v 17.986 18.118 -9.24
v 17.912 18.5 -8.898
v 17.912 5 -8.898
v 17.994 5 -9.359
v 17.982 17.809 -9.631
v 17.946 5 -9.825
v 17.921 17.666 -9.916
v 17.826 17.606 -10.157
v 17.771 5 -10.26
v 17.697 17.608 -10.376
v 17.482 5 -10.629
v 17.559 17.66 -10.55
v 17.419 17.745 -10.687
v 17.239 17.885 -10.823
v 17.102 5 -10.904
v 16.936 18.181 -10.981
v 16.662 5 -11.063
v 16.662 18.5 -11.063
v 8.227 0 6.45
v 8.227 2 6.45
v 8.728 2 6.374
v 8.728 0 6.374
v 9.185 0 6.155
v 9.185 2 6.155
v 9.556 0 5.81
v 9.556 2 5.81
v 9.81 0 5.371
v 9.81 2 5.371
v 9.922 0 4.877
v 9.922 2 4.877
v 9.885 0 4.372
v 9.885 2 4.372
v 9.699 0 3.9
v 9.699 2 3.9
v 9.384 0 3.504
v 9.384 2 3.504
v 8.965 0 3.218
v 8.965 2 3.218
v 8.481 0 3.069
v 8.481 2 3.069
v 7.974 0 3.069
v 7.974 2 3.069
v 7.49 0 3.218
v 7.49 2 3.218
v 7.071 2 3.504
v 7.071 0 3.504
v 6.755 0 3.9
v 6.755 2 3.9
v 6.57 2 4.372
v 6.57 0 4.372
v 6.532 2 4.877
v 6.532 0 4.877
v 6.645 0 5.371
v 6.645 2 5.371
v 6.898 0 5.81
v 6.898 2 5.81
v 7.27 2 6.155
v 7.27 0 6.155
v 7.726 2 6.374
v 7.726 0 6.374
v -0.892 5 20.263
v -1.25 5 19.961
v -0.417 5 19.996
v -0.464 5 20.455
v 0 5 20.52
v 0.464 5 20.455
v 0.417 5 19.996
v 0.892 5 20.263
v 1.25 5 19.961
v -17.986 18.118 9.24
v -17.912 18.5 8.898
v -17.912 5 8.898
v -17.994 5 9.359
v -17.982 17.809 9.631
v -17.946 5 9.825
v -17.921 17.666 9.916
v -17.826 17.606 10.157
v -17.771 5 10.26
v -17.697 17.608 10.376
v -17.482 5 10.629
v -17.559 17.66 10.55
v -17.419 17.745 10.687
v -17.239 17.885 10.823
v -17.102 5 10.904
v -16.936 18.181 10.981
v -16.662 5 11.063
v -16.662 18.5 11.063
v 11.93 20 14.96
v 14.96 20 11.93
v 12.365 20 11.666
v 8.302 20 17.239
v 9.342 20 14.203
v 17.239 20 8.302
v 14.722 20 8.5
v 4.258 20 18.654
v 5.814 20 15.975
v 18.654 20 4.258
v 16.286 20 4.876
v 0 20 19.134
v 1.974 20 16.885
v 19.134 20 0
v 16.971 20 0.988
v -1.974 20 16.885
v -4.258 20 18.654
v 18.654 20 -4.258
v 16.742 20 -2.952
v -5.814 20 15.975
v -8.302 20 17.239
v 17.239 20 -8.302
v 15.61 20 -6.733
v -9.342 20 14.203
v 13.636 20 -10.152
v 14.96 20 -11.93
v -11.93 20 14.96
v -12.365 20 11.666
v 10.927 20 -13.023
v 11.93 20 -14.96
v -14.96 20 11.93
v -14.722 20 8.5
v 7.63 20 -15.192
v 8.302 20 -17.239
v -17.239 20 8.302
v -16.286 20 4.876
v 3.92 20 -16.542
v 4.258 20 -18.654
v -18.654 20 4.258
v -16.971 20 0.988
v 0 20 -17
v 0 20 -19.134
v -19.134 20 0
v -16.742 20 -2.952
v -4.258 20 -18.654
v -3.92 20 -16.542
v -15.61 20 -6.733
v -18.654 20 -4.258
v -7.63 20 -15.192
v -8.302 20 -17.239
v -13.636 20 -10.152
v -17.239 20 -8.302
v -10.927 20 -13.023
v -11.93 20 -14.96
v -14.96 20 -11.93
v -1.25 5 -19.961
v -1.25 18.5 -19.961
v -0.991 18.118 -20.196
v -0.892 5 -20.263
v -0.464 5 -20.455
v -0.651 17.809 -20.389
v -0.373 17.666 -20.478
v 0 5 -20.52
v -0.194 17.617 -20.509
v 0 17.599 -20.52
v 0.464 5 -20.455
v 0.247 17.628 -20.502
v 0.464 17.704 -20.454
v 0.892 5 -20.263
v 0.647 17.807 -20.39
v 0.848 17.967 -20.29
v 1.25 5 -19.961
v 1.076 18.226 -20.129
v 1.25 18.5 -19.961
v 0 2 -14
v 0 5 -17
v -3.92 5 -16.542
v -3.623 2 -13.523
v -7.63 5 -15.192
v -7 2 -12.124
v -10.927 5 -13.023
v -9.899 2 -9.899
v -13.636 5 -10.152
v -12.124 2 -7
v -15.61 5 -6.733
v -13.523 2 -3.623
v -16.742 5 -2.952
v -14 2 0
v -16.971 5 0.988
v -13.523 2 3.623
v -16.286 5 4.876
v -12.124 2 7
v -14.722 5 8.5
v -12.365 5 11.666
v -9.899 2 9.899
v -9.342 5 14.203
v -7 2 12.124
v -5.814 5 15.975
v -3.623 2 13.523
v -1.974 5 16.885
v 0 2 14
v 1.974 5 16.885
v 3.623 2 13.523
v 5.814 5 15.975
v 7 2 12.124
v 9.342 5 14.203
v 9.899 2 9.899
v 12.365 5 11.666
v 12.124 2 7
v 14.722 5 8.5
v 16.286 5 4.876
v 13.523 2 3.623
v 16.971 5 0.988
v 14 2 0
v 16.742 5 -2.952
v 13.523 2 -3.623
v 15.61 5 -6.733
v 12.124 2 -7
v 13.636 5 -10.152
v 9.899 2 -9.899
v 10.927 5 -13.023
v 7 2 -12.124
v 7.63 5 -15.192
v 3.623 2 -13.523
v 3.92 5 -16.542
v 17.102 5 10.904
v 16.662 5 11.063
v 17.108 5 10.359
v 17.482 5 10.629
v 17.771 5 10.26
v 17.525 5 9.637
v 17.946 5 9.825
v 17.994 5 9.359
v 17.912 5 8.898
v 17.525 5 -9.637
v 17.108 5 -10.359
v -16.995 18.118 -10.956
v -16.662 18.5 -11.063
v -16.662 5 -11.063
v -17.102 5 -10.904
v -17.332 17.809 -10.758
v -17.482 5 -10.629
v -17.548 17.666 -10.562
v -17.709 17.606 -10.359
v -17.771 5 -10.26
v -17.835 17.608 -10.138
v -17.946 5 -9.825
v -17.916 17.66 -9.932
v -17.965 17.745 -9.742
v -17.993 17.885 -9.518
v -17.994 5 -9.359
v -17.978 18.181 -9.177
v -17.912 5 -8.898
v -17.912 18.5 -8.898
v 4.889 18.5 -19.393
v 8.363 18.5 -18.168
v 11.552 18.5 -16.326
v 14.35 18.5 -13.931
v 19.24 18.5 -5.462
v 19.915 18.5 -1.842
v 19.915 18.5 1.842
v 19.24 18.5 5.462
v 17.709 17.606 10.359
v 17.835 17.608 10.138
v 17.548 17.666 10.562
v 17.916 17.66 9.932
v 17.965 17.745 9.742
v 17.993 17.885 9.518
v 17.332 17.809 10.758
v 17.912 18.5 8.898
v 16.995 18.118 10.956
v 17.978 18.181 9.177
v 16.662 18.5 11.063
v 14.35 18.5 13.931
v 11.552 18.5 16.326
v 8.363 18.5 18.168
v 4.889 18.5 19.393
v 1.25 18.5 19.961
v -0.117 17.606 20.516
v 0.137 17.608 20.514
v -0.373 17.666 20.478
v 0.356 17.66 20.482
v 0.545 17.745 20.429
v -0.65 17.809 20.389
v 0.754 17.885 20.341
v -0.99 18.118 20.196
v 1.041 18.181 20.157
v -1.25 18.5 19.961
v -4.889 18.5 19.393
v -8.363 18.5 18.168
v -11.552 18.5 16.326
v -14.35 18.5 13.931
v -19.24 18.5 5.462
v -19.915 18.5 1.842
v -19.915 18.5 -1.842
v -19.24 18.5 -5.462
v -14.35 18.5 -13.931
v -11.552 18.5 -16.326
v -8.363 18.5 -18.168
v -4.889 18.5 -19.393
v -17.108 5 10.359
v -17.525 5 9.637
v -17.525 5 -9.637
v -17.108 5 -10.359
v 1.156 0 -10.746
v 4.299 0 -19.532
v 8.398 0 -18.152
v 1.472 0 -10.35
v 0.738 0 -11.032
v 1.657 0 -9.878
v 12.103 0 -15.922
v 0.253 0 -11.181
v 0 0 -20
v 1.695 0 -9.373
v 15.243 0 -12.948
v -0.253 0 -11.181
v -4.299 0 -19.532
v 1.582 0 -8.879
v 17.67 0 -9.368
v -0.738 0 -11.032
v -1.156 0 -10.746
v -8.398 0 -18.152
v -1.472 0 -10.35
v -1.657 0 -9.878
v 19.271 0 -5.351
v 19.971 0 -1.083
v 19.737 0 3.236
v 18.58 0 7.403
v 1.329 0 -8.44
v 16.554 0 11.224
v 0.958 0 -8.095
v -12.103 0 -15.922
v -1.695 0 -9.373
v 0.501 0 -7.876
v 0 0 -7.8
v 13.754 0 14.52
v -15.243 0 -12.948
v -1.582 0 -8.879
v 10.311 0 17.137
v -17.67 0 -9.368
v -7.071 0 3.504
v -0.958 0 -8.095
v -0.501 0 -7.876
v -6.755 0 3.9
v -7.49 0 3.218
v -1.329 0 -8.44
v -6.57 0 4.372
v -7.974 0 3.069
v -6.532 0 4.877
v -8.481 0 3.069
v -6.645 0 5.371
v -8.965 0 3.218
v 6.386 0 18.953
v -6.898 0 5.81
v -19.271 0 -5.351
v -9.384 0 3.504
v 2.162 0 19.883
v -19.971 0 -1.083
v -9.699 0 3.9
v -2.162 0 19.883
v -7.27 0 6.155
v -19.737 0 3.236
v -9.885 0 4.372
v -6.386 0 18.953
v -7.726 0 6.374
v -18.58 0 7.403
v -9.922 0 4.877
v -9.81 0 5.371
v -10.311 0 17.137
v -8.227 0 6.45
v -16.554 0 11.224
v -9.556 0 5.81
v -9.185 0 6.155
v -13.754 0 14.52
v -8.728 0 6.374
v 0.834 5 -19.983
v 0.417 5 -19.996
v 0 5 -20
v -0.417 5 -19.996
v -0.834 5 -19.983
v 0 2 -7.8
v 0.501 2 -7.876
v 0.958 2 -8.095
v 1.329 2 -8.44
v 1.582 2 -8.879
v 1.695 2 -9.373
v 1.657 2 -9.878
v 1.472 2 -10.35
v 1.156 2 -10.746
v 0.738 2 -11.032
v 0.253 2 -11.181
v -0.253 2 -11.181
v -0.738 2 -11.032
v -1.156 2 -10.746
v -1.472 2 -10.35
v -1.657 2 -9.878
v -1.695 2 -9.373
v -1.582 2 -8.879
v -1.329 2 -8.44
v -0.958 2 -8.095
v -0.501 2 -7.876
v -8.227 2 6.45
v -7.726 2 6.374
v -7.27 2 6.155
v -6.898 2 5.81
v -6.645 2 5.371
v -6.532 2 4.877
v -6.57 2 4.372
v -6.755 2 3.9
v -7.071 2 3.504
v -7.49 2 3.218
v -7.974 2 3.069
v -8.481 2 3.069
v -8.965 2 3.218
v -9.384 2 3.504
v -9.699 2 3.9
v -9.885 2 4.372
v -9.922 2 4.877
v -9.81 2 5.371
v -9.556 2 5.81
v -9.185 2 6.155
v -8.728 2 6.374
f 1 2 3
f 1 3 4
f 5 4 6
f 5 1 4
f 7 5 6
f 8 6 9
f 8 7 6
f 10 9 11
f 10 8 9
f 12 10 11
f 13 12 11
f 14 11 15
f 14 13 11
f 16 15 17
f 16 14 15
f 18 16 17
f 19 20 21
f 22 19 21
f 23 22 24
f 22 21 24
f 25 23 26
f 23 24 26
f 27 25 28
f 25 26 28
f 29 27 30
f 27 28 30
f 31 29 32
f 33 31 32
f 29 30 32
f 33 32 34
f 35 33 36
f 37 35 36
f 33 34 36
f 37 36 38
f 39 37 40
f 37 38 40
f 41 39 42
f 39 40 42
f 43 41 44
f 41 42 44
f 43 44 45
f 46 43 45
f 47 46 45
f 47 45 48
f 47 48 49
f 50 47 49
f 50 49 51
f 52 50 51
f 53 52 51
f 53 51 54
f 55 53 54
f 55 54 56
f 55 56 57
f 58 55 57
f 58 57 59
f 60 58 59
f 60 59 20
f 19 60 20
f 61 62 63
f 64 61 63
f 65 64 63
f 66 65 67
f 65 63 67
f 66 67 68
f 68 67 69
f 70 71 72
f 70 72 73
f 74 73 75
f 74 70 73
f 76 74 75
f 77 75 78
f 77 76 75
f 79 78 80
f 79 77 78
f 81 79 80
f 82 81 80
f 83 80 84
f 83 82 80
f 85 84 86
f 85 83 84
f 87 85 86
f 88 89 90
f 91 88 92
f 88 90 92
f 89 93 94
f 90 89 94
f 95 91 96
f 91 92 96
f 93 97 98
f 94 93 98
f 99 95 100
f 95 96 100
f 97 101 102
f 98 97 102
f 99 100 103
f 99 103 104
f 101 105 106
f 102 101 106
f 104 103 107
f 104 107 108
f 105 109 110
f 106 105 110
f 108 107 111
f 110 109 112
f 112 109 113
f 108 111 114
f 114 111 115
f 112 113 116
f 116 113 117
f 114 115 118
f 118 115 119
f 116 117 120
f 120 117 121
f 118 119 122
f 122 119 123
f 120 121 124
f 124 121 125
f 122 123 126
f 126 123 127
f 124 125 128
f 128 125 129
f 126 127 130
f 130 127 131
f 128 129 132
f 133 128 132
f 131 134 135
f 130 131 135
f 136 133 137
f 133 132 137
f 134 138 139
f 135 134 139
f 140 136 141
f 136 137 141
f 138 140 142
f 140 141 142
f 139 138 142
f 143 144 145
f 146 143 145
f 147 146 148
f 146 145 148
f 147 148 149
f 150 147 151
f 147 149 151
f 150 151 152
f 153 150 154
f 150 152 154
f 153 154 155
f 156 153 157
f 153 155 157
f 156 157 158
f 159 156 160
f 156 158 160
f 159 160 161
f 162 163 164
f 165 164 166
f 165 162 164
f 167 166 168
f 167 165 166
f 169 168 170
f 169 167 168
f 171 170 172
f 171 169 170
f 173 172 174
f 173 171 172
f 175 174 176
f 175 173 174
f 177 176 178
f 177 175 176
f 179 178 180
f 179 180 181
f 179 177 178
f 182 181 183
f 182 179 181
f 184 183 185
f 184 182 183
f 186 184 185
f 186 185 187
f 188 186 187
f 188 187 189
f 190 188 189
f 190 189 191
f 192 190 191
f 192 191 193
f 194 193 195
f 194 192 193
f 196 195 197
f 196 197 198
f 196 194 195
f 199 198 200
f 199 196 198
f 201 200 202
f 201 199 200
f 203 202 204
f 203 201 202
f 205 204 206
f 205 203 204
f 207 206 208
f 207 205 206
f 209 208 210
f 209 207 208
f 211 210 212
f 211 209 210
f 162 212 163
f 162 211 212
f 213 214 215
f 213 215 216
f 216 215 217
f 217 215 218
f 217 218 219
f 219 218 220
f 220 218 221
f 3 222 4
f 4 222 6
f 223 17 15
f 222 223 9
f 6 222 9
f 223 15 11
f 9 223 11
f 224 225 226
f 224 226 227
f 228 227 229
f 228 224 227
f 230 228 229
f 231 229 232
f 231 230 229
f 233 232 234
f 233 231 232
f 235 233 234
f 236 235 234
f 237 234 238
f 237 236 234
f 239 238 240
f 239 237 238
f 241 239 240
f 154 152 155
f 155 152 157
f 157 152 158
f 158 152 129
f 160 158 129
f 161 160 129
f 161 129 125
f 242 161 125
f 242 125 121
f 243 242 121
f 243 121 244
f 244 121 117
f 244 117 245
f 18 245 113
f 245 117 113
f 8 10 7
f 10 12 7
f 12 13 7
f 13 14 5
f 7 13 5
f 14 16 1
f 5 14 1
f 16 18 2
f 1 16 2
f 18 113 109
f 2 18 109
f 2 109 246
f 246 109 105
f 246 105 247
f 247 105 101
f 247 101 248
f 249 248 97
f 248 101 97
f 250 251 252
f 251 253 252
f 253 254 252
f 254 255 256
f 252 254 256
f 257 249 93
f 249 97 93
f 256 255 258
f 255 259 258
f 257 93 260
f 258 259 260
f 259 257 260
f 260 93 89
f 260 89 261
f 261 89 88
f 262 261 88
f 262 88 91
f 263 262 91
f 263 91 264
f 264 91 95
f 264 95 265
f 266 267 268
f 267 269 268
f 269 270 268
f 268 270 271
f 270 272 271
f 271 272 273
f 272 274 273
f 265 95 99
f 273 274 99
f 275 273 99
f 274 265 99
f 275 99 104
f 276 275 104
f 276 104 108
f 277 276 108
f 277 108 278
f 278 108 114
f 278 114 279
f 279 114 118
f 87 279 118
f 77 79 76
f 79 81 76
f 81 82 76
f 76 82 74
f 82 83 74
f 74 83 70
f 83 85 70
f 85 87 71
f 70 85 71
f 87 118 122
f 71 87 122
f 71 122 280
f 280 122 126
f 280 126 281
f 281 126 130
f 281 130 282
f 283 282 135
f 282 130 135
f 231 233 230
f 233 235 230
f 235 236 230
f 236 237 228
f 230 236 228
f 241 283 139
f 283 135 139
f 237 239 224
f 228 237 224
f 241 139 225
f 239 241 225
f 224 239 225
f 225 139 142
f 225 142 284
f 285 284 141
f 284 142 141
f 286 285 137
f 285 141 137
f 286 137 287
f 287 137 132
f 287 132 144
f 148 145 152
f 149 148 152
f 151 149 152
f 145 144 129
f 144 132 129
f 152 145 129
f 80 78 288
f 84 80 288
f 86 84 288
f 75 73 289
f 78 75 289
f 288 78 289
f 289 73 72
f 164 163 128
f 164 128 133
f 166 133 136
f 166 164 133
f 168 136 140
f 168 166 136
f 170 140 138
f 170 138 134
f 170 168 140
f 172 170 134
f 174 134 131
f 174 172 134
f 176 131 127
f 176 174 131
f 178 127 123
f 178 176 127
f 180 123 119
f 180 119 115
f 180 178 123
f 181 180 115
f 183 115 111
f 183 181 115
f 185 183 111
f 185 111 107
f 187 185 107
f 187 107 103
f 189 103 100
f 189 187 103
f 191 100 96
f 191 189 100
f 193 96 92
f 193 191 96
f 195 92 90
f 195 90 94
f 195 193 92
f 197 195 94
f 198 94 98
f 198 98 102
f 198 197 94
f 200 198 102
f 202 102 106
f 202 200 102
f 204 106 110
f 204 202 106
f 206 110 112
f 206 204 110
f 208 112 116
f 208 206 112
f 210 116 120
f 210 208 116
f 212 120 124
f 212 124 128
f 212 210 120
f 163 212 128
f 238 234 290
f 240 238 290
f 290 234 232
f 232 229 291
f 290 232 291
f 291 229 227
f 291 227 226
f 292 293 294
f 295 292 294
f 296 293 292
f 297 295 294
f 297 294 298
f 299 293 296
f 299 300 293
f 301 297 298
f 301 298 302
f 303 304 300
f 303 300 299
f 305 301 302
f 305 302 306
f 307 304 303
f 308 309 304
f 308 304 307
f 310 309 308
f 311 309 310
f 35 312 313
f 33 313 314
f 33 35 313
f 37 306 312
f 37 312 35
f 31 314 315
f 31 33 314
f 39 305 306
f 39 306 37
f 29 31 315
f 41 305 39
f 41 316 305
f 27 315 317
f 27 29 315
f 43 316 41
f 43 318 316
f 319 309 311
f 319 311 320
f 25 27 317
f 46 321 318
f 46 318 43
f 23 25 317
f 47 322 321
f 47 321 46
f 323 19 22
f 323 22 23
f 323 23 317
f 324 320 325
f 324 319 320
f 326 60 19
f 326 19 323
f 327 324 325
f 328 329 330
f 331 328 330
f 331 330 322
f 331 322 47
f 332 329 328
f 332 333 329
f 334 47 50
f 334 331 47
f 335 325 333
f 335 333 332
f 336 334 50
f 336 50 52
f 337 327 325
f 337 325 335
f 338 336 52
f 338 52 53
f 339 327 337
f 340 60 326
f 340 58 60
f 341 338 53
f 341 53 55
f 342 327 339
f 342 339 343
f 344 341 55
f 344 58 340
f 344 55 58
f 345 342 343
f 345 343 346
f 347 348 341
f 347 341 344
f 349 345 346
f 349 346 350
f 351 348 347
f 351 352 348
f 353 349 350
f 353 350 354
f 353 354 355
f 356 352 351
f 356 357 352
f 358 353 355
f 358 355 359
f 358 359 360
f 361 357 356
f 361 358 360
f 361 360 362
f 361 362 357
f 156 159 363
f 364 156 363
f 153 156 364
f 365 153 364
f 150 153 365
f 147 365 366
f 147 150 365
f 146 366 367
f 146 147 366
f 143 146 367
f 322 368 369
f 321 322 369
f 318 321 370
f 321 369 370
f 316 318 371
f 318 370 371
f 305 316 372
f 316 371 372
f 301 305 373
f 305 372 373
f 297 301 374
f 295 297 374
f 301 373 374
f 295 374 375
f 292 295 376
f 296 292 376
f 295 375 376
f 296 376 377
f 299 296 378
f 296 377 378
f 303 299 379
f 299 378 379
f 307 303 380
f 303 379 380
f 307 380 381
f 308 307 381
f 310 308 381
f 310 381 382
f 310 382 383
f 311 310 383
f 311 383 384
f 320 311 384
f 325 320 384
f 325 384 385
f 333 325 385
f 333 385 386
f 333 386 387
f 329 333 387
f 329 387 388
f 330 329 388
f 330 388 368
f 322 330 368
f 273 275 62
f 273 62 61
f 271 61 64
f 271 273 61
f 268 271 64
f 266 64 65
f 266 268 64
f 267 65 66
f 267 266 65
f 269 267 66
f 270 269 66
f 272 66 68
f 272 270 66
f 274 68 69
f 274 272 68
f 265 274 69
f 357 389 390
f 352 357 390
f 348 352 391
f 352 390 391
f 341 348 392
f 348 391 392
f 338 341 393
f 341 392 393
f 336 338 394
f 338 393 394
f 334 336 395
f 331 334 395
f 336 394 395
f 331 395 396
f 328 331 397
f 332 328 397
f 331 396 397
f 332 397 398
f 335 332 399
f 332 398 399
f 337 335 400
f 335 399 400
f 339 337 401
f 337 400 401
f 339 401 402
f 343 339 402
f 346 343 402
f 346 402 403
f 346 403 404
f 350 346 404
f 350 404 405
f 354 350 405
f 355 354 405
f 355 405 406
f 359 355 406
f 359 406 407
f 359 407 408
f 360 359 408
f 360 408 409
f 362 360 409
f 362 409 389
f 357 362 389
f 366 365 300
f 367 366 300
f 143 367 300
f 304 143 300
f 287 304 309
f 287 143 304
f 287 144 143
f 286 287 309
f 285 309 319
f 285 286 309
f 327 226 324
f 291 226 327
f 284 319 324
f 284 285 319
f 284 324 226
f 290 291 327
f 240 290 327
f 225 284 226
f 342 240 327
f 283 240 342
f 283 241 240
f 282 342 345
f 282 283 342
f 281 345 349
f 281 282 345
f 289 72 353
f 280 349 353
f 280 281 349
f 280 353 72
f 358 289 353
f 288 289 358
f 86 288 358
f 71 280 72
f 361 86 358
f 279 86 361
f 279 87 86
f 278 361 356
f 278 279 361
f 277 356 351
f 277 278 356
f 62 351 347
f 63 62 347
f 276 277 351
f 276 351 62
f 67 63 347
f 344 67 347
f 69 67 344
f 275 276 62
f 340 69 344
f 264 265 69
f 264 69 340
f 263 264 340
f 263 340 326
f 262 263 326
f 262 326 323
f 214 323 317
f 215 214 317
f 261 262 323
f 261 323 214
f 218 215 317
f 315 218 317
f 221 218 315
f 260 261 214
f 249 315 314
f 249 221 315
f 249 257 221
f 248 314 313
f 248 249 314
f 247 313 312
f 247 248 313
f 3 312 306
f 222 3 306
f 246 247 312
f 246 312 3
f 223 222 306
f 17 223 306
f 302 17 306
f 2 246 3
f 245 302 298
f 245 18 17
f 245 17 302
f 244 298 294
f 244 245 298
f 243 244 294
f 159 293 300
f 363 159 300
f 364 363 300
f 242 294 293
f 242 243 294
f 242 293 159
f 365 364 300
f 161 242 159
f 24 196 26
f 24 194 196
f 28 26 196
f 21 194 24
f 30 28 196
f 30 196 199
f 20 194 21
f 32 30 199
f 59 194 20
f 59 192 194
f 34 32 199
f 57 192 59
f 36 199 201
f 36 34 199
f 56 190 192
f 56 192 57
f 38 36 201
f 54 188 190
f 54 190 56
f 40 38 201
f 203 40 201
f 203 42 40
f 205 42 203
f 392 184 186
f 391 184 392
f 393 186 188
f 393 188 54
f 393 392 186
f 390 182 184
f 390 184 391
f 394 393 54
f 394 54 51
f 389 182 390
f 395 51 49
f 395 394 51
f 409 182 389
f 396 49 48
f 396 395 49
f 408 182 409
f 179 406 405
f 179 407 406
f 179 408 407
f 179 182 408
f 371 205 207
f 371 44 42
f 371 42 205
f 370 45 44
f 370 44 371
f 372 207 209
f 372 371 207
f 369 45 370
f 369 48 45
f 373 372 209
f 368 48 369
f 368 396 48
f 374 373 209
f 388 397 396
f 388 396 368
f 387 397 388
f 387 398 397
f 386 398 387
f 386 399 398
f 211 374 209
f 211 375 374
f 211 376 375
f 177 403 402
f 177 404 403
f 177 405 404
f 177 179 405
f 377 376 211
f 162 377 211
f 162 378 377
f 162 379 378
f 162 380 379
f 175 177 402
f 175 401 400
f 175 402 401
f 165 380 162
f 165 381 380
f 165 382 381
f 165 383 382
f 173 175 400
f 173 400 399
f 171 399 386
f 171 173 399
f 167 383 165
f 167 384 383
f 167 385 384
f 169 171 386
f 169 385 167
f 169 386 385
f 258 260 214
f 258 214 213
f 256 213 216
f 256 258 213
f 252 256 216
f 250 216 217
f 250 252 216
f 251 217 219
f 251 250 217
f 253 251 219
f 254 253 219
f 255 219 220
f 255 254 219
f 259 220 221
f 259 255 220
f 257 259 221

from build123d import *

# Parameters (mm, degrees)
BOSS_EXTRUDE1_DEPTH = 15
CUT_EXTRUDE1_REACH  = 35.839
SKETCH5_R           = 1.7
CHAMFER1_SIZE       = 3


with BuildPart() as part:
    # Sketch2 → Revolve1 (revolve)
    with BuildSketch(Plane.XY, mode=Mode.PRIVATE) as revolve1_sk:
        Polygon((0, 0), (-20, 0), (-20, 20), (-17, 20), (-17, 2), (0, 2), align=None)
    revolve(revolve1_sk.sketch.rotate(Axis((0, 0, 0), (0, 1, 0)), 270), axis=Axis((0, 0, 0), (0, 1, 0)))

    # Sketch3 → Boss-Extrude1 (add)
    with BuildSketch(Plane(origin=(0, 20, 0), x_dir=(1, 0, 0), z_dir=(0, 1, 0))):
        with BuildLine():
            ThreePointArc((-1.25, 19.960899278), (0, 20.52), (1.25, 19.960899278))
            ThreePointArc((1.25, 19.960899278), (0, 20), (-1.25, 19.960899278))
        make_face()
        with BuildLine():
            ThreePointArc((16.661645857, 11.062981394), (17.320508076, 10), (17.911645857, 8.897917884))
            ThreePointArc((17.911645857, 8.897917884), (17.770841286, 10.26), (16.661645857, 11.062981394))
        make_face()
        with BuildLine():
            ThreePointArc((17.911645857, -8.897917884), (17.320508076, -10), (16.661645857, -11.062981394))
            ThreePointArc((16.661645857, -11.062981394), (17.770841286, -10.26), (17.911645857, -8.897917884))
        make_face()
        with BuildLine():
            ThreePointArc((1.25, -19.960899278), (0, -20), (-1.25, -19.960899278))
            ThreePointArc((-1.25, -19.960899278), (0, -20.52), (1.25, -19.960899278))
        make_face()
        with BuildLine():
            ThreePointArc((-16.661645857, -11.062981394), (-17.320508076, -10), (-17.911645857, -8.897917884))
            ThreePointArc((-17.911645857, -8.897917884), (-17.770841286, -10.26), (-16.661645857, -11.062981394))
        make_face()
        with BuildLine():
            ThreePointArc((-17.911645857, 8.897917884), (-17.320508076, 10), (-16.661645857, 11.062981394))
            ThreePointArc((-16.661645857, 11.062981394), (-17.770841286, 10.26), (-17.911645857, 8.897917884))
        make_face()
    extrude(amount=-BOSS_EXTRUDE1_DEPTH)

    # Sketch4 → Cut-Revolve1 (revolve, cut)
    with BuildSketch(Plane.XY, mode=Mode.PRIVATE) as cut_revolve1_sk:
        Polygon((-21, 16.767949192), (-18.556624327, 21), (-21, 21), align=None)
    revolve(cut_revolve1_sk.sketch.rotate(Axis((0, 20, 0), (0, -1, 0)), 90), axis=Axis((0, 20, 0), (0, -1, 0)), mode=Mode.SUBTRACT)

    # Sketch5 → Cut-Extrude1 (cut, up to next)
    with BuildSketch(Plane(origin=(0, 2, 0), x_dir=(1, 0, 0), z_dir=(0, 1, 0)), mode=Mode.PRIVATE) as cut_extrude1_sk1:
        with Locations(Location((0, 9.5, 0), (0, 0, 270))):
            Circle(SKETCH5_R)
    cut_extrude1_tool1 = extrude(cut_extrude1_sk1.sketch, amount=-CUT_EXTRUDE1_REACH, mode=Mode.PRIVATE) & part.part
    # Sketch5 → Cut-Extrude1 (cut, up to next)
    with BuildSketch(Plane(origin=(0, 2, 0), x_dir=(1, 0, 0), z_dir=(0, 1, 0)), mode=Mode.PRIVATE) as cut_extrude1_sk2:
        with Locations(Location((8.227241336, -4.75, 0), (0, 0, 270))):
            Circle(SKETCH5_R)
    cut_extrude1_tool2 = extrude(cut_extrude1_sk2.sketch, amount=-CUT_EXTRUDE1_REACH, mode=Mode.PRIVATE) & part.part
    # Sketch5 → Cut-Extrude1 (cut, up to next)
    with BuildSketch(Plane(origin=(0, 2, 0), x_dir=(1, 0, 0), z_dir=(0, 1, 0)), mode=Mode.PRIVATE) as cut_extrude1_sk3:
        with Locations(Location((-8.227241336, -4.75, 0), (0, 0, 270))):
            Circle(SKETCH5_R)
    cut_extrude1_tool3 = extrude(cut_extrude1_sk3.sketch, amount=-CUT_EXTRUDE1_REACH, mode=Mode.PRIVATE) & part.part
    add(cut_extrude1_tool1.solids().sort_by_distance((0, 2, -9.5))[0], mode=Mode.SUBTRACT)
    add(cut_extrude1_tool2.solids().sort_by_distance((8.227241, 2, 4.75))[0], mode=Mode.SUBTRACT)
    add(cut_extrude1_tool3.solids().sort_by_distance((-8.227241, 2, 4.75))[0], mode=Mode.SUBTRACT)

    # Chamfer1
    chamfer1_edges = [part.edges().sort_by_distance(p)[0] for p in [
        (0, 2, 17),
    ]]
    chamfer(chamfer1_edges, length=CHAMFER1_SIZE)


solid = part.part
